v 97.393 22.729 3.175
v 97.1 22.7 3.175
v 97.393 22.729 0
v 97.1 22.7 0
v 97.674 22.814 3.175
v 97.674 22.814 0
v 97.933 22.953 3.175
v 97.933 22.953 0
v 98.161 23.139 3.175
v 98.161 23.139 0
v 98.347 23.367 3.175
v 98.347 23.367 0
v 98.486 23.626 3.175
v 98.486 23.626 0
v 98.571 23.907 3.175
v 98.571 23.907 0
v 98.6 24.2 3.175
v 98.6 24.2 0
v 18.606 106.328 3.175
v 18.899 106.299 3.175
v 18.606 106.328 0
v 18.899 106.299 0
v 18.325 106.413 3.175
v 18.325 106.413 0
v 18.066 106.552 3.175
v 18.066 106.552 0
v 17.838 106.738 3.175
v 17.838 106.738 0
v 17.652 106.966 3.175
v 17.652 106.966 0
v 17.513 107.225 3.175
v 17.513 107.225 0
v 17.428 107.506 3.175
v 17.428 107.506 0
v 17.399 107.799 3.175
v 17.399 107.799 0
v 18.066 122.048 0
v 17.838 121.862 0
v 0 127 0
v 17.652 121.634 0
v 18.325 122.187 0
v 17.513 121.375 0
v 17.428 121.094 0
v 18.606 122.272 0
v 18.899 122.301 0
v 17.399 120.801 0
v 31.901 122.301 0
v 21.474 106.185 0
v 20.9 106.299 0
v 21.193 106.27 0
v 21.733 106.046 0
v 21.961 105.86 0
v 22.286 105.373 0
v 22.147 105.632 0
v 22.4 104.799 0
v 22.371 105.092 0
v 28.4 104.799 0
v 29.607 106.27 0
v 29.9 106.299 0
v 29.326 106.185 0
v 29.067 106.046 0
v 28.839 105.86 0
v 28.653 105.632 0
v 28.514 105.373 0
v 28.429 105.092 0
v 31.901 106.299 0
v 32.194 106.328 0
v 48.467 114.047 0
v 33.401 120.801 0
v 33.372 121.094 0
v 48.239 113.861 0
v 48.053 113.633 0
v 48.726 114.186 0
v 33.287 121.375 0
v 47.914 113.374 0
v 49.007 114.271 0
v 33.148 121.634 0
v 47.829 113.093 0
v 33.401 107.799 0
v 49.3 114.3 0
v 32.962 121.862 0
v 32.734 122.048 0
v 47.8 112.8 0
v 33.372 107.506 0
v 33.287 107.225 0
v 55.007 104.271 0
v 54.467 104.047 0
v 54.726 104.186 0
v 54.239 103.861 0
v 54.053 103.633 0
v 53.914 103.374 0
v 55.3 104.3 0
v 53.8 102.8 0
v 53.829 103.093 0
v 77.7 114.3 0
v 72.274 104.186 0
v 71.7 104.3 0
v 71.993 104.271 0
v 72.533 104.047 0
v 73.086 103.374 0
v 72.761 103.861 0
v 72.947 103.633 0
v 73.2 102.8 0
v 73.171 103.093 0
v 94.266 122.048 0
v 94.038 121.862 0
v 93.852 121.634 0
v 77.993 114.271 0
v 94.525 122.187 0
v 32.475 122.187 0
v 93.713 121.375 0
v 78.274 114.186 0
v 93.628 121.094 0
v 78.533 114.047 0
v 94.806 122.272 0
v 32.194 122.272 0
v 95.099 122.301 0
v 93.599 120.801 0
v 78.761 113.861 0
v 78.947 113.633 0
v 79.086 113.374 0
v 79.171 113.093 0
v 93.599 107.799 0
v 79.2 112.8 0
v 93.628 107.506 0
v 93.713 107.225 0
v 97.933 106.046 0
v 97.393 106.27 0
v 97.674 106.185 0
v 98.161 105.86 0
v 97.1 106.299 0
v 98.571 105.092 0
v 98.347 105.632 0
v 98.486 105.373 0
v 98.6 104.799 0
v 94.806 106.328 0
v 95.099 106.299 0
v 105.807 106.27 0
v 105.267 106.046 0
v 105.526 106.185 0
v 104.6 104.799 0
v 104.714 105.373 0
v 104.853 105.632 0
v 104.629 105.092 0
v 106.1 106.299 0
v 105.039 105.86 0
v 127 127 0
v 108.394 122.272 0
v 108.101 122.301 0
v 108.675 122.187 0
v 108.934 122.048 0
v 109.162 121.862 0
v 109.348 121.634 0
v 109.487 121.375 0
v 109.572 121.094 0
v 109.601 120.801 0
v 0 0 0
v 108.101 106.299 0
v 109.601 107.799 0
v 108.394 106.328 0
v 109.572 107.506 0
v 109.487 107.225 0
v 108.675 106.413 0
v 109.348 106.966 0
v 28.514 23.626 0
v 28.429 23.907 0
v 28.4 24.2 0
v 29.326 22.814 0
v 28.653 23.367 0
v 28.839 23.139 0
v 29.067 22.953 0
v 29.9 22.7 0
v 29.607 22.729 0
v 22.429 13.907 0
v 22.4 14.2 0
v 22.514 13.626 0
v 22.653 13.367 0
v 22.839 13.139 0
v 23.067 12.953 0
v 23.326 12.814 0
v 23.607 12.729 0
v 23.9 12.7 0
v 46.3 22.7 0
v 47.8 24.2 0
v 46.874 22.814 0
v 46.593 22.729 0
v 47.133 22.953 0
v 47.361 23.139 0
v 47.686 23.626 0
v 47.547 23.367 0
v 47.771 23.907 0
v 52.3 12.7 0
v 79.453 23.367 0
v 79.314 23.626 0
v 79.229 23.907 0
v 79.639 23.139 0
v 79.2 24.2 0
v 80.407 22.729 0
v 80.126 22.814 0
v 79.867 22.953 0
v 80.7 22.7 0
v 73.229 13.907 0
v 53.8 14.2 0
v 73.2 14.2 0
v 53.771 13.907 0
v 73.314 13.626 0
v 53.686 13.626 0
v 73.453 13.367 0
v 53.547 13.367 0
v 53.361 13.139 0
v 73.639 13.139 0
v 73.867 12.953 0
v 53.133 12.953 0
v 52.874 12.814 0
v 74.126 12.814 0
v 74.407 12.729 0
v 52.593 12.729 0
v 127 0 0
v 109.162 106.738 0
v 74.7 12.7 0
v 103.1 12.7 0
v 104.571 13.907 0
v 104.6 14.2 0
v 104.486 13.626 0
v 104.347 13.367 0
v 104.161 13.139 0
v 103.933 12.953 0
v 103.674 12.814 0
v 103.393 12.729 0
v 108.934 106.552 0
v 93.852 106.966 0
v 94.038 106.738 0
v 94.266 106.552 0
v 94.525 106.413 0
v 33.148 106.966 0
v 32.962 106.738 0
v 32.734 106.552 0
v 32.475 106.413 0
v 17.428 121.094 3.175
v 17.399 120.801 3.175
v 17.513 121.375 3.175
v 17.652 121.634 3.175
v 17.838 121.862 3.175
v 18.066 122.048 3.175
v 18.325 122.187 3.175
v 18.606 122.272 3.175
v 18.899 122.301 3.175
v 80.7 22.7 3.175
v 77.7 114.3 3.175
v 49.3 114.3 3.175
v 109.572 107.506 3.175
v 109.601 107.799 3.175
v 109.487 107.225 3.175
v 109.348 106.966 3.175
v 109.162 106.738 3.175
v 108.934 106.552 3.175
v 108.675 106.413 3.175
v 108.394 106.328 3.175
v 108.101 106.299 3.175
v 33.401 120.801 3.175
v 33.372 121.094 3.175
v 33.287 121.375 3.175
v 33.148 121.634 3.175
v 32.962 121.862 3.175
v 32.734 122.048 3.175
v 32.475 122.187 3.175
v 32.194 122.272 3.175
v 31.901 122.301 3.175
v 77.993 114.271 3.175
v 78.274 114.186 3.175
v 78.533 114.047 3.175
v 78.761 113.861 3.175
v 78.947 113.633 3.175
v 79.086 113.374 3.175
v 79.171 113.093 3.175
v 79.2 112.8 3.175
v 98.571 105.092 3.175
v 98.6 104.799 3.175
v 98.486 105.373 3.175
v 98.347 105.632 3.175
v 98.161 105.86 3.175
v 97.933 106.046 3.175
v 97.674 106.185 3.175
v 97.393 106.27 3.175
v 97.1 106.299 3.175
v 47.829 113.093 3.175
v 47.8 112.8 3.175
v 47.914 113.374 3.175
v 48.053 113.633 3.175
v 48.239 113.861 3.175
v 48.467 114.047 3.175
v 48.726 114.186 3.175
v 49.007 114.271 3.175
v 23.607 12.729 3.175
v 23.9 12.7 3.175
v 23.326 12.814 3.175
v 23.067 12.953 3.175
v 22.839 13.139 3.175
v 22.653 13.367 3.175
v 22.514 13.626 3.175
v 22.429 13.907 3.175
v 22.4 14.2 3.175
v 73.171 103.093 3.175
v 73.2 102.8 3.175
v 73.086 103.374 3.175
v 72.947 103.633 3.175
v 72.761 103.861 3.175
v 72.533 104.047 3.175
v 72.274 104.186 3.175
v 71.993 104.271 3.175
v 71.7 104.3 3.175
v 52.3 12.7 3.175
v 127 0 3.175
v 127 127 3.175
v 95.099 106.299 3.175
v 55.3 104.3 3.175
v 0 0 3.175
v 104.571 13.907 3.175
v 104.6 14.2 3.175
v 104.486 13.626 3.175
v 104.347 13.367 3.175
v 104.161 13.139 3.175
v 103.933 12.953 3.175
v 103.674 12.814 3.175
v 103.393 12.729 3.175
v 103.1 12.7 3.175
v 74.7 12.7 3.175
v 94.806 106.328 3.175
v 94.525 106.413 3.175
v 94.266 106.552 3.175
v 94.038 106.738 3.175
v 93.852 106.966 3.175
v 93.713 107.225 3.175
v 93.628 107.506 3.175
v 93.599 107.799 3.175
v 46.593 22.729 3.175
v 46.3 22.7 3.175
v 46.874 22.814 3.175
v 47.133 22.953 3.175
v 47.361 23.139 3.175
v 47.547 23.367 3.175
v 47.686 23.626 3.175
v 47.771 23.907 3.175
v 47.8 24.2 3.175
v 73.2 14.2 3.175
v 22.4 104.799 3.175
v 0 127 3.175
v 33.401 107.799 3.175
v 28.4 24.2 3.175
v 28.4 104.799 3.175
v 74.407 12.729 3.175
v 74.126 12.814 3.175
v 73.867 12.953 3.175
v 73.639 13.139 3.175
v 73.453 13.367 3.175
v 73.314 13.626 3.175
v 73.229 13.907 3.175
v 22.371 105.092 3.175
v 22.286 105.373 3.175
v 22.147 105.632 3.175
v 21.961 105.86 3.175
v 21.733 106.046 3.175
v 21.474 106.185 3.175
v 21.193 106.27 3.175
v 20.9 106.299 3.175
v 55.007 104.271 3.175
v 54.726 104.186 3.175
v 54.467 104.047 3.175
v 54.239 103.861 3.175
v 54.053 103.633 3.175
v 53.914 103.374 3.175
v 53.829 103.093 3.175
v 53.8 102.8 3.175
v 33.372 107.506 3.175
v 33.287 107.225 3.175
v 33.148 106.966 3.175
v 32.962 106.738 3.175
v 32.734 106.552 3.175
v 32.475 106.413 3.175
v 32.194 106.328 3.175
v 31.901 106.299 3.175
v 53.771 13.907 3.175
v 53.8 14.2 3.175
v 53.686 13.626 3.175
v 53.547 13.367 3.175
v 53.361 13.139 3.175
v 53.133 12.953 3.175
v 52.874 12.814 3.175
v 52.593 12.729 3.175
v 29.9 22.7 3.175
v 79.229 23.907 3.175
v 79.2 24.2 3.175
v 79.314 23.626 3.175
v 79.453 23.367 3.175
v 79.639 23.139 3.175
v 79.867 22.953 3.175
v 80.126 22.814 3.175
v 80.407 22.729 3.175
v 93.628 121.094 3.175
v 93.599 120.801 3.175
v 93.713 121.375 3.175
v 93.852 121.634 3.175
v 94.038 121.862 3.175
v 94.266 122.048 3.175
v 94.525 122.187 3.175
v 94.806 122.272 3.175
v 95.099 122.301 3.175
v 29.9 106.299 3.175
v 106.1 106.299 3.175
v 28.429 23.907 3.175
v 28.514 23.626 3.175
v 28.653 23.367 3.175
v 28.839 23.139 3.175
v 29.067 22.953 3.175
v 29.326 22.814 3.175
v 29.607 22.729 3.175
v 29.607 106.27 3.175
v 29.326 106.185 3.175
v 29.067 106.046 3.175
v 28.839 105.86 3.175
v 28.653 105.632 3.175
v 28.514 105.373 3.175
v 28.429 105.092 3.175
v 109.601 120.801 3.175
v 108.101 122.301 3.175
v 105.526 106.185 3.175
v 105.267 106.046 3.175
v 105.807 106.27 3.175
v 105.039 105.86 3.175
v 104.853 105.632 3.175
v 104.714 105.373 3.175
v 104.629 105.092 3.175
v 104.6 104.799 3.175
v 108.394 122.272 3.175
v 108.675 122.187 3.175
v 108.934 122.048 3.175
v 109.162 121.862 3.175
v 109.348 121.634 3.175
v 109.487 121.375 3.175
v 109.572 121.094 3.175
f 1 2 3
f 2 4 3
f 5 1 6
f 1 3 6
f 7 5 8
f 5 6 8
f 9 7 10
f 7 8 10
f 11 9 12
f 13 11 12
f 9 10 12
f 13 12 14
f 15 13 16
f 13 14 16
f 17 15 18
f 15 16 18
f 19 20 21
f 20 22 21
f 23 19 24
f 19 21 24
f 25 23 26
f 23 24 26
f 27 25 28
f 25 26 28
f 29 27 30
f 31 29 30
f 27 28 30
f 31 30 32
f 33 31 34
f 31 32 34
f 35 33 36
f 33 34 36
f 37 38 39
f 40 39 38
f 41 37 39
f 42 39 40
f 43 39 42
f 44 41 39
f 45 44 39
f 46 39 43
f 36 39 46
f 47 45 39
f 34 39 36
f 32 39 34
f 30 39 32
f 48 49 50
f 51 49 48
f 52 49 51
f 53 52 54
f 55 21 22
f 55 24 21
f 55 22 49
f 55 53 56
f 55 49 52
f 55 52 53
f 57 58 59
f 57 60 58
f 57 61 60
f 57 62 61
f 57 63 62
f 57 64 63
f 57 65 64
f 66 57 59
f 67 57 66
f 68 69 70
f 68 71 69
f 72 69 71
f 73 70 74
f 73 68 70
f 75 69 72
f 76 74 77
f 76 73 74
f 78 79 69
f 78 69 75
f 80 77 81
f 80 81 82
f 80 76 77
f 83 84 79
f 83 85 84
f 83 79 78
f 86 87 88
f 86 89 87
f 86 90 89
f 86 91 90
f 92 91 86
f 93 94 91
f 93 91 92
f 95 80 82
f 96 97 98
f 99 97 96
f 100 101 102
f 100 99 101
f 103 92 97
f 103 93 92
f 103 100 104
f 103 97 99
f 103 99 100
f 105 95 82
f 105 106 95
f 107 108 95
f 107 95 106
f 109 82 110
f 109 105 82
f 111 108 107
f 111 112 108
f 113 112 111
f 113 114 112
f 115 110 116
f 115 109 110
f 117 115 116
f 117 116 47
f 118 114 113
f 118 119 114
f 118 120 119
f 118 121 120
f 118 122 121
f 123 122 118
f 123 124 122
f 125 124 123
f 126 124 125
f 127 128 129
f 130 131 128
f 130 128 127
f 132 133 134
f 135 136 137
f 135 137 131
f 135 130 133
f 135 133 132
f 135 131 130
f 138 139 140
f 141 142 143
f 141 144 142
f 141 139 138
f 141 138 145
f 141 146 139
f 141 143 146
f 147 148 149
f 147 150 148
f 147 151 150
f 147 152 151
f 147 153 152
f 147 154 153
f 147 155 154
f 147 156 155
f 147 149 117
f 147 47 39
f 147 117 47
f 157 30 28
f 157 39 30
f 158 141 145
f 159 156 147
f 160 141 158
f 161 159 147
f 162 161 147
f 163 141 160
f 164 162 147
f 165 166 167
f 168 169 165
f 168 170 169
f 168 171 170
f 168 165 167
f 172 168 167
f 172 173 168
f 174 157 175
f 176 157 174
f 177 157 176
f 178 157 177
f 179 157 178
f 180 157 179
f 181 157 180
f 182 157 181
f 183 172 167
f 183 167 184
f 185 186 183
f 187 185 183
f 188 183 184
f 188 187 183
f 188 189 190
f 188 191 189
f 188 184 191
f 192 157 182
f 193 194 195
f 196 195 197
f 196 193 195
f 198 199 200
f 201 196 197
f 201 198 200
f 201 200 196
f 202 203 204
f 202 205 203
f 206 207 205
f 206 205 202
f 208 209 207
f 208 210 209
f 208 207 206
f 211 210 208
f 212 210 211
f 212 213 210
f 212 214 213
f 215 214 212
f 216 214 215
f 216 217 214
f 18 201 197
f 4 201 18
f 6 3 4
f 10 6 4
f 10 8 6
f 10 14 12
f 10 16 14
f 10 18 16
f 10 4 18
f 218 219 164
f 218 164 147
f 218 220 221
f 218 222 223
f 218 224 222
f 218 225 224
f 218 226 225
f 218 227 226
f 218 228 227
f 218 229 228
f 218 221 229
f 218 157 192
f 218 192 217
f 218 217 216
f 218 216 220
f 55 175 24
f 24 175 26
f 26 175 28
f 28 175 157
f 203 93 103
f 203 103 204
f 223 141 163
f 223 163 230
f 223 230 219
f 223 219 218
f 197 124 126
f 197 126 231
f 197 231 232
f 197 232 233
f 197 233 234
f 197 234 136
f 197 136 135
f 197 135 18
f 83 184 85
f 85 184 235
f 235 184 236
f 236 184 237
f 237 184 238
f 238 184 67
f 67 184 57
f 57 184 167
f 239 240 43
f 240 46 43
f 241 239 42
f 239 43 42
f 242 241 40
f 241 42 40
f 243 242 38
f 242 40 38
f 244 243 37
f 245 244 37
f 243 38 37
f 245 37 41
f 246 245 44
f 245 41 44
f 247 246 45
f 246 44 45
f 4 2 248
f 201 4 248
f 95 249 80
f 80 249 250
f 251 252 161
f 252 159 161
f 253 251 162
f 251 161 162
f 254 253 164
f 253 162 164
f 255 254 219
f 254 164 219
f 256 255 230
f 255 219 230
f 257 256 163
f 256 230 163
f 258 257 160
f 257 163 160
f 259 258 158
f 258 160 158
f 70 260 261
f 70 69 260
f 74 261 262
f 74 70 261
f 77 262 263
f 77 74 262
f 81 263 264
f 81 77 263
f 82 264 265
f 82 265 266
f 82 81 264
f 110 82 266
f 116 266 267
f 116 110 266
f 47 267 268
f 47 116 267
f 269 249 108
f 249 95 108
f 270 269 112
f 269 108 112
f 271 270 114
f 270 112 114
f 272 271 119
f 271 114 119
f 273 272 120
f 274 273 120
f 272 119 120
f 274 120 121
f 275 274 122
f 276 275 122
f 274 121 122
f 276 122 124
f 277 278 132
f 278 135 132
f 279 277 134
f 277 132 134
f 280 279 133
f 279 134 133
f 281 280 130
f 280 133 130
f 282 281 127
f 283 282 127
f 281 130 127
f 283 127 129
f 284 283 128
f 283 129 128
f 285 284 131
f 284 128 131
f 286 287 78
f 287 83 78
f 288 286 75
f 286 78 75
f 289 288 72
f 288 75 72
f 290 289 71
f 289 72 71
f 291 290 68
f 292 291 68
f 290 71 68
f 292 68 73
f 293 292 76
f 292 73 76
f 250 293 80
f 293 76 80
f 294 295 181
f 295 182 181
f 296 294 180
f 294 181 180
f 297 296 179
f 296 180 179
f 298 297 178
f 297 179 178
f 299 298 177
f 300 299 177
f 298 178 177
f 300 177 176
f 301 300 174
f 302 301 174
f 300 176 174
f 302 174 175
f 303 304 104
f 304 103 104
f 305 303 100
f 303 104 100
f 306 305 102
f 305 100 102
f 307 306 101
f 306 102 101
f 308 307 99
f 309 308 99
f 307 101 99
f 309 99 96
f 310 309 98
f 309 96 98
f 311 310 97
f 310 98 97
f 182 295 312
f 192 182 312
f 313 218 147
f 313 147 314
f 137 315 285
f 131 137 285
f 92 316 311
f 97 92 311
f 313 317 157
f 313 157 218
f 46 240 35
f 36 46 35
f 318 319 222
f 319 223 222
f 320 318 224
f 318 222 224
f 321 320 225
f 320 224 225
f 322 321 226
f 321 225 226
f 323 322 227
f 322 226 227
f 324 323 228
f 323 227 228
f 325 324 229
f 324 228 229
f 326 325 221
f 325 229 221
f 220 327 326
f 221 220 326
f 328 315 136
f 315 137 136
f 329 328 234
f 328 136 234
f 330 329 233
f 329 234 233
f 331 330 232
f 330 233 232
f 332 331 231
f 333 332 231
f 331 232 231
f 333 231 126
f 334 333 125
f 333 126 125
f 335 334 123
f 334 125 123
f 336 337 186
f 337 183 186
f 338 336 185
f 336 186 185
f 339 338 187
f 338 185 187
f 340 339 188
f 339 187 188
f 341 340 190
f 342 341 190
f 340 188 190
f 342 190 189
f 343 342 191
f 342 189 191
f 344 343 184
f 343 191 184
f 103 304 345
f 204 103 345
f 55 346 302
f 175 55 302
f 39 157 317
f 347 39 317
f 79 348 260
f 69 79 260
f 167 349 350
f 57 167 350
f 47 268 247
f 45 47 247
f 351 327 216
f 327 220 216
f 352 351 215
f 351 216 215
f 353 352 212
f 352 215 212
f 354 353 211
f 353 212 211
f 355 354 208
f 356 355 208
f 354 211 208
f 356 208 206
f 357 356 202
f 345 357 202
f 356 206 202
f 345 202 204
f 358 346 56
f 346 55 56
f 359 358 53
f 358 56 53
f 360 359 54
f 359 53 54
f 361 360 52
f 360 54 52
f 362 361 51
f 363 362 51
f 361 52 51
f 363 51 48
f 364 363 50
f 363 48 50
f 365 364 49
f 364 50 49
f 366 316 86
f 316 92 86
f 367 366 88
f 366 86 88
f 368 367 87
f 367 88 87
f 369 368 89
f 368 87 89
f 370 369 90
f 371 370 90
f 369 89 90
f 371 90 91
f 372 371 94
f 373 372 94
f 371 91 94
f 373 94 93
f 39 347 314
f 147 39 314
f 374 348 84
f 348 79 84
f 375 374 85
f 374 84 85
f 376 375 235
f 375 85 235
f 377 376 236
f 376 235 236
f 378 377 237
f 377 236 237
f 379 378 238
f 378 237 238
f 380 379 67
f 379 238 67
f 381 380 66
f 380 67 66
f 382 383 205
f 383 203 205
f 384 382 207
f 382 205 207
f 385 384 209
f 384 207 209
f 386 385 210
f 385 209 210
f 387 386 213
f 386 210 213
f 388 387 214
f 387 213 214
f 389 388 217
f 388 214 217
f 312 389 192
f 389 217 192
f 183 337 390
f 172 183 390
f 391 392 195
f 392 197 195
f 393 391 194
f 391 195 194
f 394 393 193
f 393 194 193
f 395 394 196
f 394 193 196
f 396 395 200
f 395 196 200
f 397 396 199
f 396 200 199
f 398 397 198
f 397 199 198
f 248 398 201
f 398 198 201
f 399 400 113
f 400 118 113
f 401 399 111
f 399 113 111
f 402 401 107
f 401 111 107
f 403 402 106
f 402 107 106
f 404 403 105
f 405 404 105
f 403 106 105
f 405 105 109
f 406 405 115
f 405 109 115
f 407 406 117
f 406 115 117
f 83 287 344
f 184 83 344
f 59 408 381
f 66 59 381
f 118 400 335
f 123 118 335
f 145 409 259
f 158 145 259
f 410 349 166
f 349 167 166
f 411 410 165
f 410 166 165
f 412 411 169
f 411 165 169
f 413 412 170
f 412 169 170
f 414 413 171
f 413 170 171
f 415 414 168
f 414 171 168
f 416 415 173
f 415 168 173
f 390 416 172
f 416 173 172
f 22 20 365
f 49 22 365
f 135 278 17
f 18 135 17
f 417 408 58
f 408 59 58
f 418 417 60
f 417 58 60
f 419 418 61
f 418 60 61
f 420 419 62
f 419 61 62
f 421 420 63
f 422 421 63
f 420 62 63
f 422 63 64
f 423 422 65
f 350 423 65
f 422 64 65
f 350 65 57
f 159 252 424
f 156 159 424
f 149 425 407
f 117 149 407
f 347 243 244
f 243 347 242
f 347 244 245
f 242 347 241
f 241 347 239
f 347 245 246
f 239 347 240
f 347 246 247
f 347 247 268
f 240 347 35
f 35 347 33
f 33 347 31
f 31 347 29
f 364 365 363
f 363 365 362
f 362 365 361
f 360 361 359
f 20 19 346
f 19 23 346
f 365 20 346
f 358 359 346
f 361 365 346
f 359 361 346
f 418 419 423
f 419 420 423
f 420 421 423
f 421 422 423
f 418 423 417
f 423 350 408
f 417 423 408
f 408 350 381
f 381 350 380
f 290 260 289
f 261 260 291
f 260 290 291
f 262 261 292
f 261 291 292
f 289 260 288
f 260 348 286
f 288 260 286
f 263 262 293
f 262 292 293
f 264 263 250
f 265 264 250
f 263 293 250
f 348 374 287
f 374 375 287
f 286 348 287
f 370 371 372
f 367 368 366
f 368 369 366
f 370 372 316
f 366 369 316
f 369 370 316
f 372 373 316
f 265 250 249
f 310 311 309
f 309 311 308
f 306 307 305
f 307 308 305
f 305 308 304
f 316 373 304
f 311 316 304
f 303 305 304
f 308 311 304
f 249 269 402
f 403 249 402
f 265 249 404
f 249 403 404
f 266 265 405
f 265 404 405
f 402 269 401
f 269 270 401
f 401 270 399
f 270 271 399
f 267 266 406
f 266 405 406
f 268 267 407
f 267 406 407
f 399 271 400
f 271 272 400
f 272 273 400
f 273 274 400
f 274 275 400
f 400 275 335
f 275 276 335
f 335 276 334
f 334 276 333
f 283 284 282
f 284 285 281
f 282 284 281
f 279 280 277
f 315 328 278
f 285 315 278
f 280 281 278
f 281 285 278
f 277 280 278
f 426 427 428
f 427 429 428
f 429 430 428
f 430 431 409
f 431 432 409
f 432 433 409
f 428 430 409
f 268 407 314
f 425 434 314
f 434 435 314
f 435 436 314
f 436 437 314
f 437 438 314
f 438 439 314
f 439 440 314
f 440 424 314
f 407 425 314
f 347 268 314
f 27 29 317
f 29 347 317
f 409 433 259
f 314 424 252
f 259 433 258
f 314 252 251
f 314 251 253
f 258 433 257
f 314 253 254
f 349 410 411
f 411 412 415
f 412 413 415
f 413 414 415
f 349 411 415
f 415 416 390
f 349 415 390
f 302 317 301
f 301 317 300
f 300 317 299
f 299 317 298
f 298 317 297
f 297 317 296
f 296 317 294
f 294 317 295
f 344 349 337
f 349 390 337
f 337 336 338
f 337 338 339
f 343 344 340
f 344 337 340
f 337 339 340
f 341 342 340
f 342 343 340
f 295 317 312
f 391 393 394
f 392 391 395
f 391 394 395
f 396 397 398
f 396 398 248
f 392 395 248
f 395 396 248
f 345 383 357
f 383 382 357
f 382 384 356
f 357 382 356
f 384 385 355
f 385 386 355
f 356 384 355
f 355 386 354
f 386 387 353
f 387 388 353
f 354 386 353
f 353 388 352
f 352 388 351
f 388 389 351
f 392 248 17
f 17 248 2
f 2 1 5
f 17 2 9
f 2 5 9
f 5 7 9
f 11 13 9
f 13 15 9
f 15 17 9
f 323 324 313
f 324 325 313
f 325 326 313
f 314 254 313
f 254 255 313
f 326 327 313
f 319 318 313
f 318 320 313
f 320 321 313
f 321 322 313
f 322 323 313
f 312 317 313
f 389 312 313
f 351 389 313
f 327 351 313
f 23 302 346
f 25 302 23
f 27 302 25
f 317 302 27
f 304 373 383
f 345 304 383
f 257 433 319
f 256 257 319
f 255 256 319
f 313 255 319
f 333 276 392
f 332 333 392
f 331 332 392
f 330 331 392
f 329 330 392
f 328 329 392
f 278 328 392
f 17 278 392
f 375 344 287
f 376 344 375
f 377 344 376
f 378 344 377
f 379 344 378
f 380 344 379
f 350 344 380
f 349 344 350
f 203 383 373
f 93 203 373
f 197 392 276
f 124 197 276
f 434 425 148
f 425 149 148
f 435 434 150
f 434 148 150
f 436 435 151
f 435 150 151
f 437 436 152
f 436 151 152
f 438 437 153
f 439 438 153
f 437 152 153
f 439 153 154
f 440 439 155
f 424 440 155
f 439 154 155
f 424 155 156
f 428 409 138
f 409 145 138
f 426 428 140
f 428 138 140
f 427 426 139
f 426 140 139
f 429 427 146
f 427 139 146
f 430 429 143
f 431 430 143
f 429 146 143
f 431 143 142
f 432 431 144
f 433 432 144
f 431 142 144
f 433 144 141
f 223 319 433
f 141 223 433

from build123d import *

# Parameters (mm, degrees)
F0_W     = 127
F0_H     = 3.175
F1_DEPTH = 127
F3_DEPTH = 25
F4_R     = 1.5


with BuildPart() as f1:
    # F0 (on Front) → F1 (new body)
    with BuildSketch(Plane.XZ):
        with Locations((63.5, 1.5875)):
            Rectangle(F0_W, F0_H)
    extrude(amount=-F1_DEPTH)

    # F2 (on face) → F3 (cut)
    with BuildSketch(Plane.XY.offset(3.175)):
        Polygon((33.401, 106.299), (33.401, 122.301), (17.399, 122.301), (17.399, 106.299), (22.4, 106.299), (22.4, 12.7), (28.4, 12.7), (47.8, 12.7), (53.8, 12.7), (53.8, 104.3), (73.2, 104.3), (73.2, 12.7), (79.2, 12.7), (98.6, 12.7), (104.6, 12.7), (104.6, 106.299), (109.601, 106.299), (109.601, 122.301), (93.599, 122.301), (93.599, 106.299), (98.6, 106.299), (98.6, 22.7), (79.2, 22.7), (79.2, 114.3), (73.2, 114.3), (53.8, 114.3), (47.8, 114.3), (47.8, 22.7), (28.4, 22.7), (28.4, 106.299), align=None)
    extrude(amount=-F3_DEPTH, mode=Mode.SUBTRACT)

    # F4
    f4_edges = [f1.edges().sort_by_distance(p)[0] for p in [
        (17.399, 122.301, 1.5875),
        (33.401, 122.301, 1.5875),
        (17.399, 106.299, 1.5875),
        (22.4, 106.299, 1.5875),
        (28.4, 106.299, 1.5875),
        (33.401, 106.299, 1.5875),
        (53.8, 104.3, 1.5875),
        (73.2, 104.3, 1.5875),
        (98.6, 106.299, 1.5875),
        (104.6, 106.299, 1.5875),
        (104.6, 12.7, 1.5875),
        (79.2, 22.7, 1.5875),
        (28.4, 22.7, 1.5875),
        (53.8, 12.7, 1.5875),
        (47.8, 22.7, 1.5875),
        (98.6, 22.7, 1.5875),
        (73.2, 12.7, 1.5875),
        (22.4, 12.7, 1.5875),
        (109.601, 122.301, 1.5875),
        (79.2, 114.3, 1.5875),
        (47.8, 114.3, 1.5875),
        (93.599, 122.301, 1.5875),
        (109.601, 106.299, 1.5875),
        (93.599, 106.299, 1.5875),
    ]]
    fillet(f4_edges, radius=F4_R)


solid = f1.part
